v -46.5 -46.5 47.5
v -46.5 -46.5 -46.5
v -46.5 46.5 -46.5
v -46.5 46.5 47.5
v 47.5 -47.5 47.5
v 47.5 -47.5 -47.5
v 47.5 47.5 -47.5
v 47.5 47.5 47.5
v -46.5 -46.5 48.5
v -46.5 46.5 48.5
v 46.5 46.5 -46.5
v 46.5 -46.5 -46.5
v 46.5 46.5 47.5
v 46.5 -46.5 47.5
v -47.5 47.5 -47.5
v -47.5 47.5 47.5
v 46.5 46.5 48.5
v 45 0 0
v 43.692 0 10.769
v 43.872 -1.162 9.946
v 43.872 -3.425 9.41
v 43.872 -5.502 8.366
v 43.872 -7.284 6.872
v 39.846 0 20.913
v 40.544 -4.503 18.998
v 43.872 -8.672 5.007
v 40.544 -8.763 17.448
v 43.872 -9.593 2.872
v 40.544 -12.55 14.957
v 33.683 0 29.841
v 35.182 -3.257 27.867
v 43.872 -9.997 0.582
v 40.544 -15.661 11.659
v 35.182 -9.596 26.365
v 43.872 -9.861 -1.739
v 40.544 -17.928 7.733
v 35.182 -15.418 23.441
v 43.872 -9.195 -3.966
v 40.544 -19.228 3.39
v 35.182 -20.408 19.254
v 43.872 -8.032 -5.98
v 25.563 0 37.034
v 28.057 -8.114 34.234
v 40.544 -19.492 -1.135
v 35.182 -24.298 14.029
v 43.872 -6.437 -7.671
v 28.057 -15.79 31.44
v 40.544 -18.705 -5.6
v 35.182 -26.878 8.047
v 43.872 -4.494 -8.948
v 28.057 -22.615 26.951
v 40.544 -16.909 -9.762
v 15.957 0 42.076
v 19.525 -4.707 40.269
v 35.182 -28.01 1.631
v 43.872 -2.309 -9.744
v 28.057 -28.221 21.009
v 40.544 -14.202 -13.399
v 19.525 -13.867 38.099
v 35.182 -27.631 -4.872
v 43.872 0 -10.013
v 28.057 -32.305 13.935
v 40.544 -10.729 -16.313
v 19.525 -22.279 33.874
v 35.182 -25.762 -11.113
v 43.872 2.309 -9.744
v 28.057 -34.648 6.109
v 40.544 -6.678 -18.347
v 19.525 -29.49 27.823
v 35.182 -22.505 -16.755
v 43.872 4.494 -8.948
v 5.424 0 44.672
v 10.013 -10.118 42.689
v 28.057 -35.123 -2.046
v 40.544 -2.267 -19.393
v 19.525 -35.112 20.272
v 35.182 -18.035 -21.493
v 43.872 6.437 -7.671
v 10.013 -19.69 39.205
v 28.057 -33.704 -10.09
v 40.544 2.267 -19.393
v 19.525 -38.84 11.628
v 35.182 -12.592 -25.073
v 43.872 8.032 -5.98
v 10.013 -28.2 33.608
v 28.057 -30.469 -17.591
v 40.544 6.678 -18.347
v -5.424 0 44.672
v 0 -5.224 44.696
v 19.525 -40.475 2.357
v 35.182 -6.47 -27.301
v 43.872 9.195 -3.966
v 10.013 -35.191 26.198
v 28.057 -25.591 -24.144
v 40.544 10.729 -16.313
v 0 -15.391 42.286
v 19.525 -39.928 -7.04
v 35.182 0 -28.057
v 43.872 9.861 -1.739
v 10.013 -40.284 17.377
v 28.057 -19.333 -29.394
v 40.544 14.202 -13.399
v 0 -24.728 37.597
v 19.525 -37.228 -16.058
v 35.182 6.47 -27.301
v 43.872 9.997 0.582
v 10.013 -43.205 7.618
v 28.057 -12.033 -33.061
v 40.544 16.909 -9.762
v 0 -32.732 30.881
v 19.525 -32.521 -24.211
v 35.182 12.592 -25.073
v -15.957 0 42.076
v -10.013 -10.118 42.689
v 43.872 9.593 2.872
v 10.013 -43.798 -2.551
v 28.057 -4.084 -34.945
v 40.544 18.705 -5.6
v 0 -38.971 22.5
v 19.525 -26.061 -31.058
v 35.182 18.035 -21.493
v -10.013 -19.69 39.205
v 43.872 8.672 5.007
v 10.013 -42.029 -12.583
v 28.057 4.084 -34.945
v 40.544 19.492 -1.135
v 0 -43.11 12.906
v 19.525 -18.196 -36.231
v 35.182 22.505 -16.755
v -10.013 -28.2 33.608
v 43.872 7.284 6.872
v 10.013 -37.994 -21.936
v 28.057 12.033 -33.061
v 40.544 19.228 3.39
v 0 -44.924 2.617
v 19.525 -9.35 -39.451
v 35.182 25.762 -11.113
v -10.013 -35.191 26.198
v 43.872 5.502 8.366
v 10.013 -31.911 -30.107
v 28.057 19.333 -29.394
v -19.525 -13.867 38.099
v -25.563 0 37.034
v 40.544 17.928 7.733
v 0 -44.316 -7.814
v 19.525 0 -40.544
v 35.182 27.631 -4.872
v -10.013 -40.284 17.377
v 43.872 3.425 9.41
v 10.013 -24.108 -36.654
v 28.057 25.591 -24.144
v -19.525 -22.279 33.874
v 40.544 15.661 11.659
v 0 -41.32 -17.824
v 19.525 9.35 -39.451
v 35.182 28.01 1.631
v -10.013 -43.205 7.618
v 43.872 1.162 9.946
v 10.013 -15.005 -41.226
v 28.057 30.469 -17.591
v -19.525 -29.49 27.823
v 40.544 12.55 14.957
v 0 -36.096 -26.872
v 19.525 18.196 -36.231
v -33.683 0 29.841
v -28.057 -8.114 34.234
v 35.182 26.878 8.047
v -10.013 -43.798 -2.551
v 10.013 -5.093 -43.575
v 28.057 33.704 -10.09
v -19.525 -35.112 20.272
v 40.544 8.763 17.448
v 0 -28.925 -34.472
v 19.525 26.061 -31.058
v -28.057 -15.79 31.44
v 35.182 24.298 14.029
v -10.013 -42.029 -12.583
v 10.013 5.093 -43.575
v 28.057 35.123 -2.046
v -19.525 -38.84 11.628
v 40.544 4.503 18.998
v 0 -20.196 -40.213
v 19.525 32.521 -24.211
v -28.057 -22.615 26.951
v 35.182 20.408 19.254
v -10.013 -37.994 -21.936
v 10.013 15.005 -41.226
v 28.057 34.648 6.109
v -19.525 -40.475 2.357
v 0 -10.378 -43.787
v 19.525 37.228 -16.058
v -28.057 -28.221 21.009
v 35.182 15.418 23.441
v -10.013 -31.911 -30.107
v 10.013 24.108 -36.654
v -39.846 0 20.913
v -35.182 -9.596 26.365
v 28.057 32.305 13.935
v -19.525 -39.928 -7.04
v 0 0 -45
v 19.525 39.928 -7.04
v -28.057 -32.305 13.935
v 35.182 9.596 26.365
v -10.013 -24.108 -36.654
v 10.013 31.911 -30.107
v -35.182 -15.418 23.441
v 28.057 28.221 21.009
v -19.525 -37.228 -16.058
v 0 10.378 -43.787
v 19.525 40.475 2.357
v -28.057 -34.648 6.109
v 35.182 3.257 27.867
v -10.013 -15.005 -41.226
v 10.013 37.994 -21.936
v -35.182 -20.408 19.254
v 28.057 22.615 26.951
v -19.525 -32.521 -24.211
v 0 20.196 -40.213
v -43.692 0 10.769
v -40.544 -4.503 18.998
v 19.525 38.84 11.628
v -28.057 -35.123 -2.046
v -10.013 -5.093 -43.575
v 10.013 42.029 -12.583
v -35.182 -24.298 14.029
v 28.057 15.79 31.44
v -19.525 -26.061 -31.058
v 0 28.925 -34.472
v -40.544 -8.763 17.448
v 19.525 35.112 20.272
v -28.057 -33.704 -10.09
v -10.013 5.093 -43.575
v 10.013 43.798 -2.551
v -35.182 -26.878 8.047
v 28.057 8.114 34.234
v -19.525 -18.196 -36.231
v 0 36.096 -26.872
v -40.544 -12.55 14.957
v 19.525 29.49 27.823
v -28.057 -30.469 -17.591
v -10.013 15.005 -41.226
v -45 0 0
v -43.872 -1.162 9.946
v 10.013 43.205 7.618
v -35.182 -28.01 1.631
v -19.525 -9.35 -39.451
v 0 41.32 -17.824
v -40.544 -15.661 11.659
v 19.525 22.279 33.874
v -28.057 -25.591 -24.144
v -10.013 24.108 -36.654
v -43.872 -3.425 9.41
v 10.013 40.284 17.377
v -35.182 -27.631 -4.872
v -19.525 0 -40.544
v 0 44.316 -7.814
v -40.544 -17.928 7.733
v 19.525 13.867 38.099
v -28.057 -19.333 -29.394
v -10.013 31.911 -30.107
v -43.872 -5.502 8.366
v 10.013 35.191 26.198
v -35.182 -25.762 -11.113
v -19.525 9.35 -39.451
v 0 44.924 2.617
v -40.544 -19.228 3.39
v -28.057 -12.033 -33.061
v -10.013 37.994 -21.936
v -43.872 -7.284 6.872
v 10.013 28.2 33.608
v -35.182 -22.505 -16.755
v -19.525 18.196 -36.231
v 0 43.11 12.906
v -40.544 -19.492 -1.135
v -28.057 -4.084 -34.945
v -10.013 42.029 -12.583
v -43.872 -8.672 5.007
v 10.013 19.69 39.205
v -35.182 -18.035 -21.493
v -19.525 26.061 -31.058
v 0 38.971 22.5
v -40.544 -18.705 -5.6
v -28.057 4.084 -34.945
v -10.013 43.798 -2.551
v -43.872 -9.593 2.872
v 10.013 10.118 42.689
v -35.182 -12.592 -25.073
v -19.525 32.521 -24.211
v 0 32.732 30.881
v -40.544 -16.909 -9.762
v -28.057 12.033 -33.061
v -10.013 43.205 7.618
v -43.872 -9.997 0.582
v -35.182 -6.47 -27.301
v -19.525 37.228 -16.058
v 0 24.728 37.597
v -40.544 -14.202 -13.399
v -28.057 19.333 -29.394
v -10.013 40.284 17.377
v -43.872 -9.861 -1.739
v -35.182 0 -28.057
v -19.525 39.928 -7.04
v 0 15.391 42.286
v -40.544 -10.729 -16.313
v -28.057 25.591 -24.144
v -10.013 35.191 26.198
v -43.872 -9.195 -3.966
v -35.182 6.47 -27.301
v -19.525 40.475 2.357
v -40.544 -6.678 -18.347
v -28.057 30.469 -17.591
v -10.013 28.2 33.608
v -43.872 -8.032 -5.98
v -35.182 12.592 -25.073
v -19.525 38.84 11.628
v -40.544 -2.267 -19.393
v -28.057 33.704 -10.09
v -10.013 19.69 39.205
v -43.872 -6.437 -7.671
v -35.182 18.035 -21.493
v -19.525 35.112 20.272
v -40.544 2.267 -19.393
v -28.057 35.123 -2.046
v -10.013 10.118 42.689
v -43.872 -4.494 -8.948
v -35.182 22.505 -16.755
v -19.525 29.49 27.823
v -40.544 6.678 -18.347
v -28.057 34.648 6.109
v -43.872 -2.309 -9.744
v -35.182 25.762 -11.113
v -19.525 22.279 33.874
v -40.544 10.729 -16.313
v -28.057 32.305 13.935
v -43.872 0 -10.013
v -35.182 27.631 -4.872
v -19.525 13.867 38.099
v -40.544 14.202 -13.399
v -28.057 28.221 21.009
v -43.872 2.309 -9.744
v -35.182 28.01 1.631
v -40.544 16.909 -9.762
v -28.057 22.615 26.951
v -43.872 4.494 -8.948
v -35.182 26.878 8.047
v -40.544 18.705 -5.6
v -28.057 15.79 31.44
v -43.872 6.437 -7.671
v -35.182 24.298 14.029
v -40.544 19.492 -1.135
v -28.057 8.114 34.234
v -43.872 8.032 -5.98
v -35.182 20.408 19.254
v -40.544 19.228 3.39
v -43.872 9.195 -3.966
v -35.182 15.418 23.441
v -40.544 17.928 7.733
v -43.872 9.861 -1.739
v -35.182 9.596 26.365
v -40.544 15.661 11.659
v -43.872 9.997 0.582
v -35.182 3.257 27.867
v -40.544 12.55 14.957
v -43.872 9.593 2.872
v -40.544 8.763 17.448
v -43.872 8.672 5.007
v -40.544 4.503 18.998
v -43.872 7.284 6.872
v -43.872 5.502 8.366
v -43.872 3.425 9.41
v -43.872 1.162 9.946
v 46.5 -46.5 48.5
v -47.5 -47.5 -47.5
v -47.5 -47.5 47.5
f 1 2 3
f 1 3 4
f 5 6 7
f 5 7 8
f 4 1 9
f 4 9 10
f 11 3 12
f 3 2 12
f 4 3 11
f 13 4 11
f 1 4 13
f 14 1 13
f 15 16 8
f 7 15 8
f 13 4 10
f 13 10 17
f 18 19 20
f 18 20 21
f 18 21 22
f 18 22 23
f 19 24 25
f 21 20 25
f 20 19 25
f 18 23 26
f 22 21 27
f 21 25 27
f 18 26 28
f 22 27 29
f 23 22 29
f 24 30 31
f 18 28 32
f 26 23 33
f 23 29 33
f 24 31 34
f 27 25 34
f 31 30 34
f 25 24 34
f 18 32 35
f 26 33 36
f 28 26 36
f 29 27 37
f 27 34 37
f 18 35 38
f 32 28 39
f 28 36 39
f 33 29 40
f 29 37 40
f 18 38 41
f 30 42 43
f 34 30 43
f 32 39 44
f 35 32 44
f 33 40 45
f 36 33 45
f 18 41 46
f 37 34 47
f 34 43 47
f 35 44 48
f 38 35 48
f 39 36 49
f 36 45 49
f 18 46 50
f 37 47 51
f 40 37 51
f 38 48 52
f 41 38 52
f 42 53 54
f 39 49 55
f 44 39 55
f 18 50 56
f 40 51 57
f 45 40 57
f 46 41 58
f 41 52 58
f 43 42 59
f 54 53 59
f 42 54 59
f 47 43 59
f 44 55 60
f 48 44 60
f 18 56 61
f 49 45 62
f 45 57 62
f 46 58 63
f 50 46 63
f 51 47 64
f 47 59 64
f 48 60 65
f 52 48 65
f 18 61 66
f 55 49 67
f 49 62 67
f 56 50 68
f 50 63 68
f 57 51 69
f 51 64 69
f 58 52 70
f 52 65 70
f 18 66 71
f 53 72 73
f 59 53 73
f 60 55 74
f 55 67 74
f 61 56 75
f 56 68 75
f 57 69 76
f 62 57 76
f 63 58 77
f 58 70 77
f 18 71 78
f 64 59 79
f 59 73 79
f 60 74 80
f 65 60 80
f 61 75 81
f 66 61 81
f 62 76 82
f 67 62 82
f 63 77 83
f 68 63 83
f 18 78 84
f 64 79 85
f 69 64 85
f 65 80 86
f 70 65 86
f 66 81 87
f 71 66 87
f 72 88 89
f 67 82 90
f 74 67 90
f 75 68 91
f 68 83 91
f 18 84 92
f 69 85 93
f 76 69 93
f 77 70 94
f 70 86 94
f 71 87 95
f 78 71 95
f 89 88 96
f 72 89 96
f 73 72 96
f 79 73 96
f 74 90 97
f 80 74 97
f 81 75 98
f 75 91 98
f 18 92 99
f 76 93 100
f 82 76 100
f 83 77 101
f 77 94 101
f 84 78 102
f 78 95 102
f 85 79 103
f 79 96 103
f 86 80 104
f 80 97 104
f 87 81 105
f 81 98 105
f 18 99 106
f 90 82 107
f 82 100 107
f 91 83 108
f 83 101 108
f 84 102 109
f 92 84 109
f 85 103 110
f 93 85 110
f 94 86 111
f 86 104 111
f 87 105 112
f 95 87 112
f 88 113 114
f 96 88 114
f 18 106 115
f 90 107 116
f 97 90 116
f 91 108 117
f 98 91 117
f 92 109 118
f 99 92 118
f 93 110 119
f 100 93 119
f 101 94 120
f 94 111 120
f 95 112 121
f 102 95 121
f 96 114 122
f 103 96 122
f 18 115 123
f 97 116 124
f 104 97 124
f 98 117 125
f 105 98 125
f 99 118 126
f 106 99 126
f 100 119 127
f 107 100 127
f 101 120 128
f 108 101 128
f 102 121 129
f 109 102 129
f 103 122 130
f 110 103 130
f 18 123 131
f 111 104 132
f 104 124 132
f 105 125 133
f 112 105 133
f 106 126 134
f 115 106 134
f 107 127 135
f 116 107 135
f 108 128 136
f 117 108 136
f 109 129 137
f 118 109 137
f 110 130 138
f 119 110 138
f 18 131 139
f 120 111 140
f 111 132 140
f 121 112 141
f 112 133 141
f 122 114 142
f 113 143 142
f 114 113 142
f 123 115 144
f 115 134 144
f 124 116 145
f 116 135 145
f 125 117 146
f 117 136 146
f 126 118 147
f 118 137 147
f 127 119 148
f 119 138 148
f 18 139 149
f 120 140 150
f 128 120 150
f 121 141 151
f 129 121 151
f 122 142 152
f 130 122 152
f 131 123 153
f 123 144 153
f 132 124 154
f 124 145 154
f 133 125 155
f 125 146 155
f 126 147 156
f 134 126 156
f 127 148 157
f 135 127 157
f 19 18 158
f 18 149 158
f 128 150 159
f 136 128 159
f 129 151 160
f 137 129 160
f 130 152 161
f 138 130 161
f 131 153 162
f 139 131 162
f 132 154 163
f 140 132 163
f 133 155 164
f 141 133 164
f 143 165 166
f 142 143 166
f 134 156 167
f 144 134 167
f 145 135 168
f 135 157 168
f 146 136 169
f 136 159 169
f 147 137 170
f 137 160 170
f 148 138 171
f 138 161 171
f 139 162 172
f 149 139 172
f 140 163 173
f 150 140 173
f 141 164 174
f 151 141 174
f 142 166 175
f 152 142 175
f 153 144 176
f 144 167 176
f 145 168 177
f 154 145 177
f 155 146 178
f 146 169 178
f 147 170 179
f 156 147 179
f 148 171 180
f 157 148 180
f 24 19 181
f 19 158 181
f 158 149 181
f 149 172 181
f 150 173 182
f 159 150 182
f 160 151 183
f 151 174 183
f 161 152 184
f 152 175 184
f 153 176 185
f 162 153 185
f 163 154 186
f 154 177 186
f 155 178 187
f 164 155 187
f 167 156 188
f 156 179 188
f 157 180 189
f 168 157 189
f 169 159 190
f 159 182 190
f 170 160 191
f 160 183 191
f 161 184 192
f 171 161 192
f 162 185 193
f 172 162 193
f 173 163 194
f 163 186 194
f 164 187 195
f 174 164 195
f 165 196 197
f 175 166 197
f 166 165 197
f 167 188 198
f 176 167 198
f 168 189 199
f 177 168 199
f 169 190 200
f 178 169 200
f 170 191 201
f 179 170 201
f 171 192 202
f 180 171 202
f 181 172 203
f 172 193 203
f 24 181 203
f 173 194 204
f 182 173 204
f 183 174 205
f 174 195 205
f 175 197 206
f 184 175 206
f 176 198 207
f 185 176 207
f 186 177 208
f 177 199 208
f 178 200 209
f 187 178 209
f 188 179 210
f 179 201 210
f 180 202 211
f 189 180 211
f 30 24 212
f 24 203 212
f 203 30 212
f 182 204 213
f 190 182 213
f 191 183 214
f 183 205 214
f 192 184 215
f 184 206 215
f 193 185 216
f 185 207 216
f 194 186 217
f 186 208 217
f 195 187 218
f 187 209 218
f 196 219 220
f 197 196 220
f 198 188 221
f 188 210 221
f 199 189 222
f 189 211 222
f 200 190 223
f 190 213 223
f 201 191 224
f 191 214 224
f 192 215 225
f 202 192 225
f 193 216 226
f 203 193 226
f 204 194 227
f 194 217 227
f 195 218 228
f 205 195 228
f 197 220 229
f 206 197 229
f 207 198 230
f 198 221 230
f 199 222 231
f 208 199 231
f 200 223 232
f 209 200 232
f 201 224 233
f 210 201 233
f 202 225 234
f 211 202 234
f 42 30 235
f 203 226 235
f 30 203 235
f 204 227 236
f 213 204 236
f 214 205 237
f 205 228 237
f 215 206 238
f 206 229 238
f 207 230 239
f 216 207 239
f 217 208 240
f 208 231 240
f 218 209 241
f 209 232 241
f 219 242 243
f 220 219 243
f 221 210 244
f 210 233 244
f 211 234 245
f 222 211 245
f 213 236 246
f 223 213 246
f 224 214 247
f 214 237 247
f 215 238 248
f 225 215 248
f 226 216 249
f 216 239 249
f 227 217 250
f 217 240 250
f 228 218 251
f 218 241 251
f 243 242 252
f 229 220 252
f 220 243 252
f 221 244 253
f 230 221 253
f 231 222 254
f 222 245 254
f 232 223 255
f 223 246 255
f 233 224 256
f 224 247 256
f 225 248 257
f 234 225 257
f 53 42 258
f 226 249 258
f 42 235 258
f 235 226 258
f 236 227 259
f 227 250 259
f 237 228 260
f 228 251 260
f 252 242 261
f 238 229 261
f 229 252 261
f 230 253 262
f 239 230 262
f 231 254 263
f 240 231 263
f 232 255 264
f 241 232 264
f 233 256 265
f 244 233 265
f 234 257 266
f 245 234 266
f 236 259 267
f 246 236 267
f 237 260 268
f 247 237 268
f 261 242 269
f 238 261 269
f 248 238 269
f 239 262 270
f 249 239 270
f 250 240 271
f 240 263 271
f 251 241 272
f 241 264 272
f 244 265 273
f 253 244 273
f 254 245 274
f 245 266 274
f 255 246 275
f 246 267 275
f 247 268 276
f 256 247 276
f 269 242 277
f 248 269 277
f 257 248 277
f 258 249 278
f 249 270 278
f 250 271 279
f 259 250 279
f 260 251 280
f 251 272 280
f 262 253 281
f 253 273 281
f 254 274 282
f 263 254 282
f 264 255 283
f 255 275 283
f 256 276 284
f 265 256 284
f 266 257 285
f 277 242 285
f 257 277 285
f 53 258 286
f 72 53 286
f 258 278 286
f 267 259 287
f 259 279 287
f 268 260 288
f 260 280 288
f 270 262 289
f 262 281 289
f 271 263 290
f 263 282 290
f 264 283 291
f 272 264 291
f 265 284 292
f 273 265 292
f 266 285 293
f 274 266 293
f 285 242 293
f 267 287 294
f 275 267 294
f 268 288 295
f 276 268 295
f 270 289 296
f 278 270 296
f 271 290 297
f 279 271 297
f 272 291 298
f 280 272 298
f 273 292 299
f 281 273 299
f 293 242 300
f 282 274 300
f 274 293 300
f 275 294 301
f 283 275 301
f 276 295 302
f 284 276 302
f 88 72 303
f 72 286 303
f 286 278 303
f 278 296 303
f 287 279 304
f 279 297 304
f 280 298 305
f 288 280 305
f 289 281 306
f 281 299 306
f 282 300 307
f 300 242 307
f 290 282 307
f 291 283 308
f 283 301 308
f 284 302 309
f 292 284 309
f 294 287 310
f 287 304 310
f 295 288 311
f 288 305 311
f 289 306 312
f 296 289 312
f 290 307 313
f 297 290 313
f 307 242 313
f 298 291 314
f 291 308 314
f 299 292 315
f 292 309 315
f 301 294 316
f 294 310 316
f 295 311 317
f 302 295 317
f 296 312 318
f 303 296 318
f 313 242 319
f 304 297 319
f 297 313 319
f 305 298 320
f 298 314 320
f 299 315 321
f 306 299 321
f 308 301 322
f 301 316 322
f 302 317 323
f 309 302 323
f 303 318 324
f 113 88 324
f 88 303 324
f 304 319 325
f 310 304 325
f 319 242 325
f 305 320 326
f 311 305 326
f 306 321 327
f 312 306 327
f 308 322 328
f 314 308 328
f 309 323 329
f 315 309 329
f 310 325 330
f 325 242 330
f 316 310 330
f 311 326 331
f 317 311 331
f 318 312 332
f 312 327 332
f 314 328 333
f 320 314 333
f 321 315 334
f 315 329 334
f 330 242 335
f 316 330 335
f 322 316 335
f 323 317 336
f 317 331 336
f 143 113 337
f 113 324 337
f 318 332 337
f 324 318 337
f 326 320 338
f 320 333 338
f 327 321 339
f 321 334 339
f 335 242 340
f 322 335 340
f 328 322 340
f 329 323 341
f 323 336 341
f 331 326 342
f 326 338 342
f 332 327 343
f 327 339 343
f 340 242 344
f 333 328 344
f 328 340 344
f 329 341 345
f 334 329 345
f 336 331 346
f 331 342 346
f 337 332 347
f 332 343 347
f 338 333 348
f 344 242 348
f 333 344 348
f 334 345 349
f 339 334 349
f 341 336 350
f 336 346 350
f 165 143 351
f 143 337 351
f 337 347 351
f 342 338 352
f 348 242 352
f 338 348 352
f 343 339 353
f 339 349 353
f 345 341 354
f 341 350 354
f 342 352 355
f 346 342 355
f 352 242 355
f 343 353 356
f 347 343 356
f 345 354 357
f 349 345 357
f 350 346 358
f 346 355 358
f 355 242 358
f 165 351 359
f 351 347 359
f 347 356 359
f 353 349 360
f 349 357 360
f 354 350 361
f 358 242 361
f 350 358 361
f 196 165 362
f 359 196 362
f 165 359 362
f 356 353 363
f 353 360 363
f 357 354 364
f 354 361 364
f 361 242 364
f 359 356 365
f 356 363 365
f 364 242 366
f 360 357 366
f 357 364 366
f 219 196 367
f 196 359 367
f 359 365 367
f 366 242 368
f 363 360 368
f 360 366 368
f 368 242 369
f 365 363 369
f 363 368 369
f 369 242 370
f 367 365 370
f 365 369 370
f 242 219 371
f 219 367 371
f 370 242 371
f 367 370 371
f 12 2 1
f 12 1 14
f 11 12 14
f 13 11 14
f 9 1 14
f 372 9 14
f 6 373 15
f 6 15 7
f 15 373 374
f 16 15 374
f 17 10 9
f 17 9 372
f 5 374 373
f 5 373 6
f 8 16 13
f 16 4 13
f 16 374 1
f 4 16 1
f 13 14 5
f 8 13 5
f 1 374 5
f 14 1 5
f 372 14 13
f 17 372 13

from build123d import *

# Parameters (mm, degrees)
F2_W     = 95
F2_H     = 95
F3_DEPTH = 47.5
F4_T     = -1
F5_W     = 93
F5_H     = 93
F6_DEPTH = 1


with BuildPart() as f1:
    # F0 (on Front) → F1 (revolve)
    with BuildSketch(Plane.XZ):
        with BuildLine():
            Line((-45, 0), (45, 0))
            ThreePointArc((45, 0), (0, 45), (-45, 0))
        make_face()
    revolve(axis=Axis((0, 0, 0), (1, 0, 0)))


with BuildPart() as f3:
    # F2 (on Front) → F3 (new body, symmetric)
    with BuildSketch(Plane.XZ):
        Rectangle(F2_W, F2_H)
    extrude(amount=F3_DEPTH, both=True)

    # F4
    f4_openings = [f3.faces().sort_by_distance(p)[0] for p in [
        (0, 0, 47.5),
    ]]
    offset(amount=F4_T, openings=f4_openings)


with BuildPart() as f6:
    # F5 (on face) → F6 (new body)
    with BuildSketch(Plane.XY.offset(47.5)):
        Rectangle(F5_W, F5_H)
    extrude(amount=F6_DEPTH)


solid = Compound([f1.part, f3.part, f6.part])
